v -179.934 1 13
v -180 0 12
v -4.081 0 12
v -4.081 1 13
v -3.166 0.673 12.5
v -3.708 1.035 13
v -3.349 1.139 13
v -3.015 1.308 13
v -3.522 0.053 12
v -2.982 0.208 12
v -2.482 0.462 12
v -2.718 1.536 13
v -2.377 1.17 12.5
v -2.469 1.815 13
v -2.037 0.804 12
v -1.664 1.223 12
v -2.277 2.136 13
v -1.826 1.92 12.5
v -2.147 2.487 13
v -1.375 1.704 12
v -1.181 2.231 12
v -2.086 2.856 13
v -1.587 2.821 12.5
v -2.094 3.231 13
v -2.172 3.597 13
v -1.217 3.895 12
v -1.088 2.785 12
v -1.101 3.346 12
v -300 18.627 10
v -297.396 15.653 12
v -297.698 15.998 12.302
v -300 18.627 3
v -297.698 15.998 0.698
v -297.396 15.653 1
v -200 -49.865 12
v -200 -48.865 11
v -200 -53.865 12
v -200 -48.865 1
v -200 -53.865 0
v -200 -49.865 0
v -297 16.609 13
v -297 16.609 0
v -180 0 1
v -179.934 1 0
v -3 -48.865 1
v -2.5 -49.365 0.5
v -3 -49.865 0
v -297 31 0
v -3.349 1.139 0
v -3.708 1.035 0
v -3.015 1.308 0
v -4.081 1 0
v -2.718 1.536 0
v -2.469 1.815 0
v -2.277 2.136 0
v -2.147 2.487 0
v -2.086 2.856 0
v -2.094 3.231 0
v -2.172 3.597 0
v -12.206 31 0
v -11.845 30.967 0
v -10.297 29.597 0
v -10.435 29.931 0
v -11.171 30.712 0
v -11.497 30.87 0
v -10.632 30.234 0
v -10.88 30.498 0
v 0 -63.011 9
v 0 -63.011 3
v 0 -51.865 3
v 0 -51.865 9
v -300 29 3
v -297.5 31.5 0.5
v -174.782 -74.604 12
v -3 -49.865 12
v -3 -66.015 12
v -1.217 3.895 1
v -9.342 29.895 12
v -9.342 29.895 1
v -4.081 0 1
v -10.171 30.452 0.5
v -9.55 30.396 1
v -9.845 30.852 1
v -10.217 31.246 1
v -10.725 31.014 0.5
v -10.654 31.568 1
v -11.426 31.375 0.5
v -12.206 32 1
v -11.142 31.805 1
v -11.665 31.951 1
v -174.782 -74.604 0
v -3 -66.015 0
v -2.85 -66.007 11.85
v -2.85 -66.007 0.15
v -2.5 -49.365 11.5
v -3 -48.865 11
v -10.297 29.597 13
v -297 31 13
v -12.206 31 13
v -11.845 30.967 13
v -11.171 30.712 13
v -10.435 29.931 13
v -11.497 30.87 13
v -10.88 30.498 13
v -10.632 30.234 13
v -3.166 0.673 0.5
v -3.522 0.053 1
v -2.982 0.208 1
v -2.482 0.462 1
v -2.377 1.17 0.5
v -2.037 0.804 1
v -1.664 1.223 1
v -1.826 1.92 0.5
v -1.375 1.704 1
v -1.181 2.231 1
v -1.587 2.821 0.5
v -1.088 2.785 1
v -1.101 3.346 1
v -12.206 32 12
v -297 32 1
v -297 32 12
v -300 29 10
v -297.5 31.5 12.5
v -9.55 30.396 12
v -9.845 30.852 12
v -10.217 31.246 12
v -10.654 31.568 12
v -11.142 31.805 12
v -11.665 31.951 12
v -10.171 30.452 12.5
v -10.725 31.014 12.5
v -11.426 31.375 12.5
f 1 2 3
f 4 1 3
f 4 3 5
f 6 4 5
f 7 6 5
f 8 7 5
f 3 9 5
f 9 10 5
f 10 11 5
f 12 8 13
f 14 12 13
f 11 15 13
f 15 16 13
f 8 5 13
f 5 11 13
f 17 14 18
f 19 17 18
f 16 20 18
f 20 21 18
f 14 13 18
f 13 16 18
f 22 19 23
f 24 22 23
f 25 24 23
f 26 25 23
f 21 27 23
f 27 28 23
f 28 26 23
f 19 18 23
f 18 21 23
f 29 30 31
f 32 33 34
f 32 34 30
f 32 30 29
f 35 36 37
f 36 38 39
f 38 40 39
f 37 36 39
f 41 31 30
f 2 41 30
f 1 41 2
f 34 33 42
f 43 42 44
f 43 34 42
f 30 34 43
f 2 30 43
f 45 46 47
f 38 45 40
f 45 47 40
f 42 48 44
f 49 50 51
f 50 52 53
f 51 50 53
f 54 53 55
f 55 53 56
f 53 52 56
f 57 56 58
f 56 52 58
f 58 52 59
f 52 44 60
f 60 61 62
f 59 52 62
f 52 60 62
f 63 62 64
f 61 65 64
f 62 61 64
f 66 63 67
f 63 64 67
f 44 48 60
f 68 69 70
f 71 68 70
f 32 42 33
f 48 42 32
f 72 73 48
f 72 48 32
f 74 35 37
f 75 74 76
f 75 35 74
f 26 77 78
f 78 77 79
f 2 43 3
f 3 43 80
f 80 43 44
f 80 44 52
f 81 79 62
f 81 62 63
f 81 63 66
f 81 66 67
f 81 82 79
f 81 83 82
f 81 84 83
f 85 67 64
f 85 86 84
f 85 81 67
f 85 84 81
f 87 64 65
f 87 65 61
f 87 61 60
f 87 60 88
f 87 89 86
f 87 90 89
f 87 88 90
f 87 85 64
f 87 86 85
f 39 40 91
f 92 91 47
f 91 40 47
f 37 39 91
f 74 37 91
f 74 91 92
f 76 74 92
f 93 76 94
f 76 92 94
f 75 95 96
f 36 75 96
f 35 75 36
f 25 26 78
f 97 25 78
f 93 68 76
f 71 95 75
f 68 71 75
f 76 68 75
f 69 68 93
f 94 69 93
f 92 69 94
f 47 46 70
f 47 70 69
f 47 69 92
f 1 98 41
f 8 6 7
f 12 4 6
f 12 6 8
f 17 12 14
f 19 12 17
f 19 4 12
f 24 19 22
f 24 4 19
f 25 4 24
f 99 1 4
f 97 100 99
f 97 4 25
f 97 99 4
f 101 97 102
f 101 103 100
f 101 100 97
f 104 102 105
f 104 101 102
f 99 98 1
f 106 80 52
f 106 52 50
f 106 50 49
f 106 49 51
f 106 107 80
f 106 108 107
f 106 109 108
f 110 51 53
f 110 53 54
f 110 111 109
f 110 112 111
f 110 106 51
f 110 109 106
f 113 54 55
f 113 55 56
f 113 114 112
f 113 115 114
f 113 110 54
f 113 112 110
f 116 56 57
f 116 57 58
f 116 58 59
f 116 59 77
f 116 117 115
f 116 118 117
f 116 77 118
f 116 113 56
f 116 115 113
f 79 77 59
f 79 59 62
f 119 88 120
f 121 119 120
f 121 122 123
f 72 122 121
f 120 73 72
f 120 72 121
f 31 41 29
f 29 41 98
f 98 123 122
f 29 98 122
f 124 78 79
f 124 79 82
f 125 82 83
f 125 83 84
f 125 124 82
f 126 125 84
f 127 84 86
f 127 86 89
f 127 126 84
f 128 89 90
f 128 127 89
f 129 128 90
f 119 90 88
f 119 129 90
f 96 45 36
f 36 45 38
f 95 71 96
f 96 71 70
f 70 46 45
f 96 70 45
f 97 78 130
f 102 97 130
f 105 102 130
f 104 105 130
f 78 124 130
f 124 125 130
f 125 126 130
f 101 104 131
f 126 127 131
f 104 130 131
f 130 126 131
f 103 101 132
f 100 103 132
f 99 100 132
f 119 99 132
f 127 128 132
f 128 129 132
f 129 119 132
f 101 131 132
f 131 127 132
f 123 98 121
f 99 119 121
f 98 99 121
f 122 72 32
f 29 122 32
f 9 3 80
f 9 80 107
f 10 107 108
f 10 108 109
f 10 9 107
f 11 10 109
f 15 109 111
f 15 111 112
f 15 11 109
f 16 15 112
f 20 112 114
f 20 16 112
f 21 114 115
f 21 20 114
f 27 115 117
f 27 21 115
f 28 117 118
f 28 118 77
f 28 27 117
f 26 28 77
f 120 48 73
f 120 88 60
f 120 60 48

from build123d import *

# Parameters (mm, degrees)
F1_DEPTH    = 13
F2_R        = 3
F3_T1_DEPTH = 31.4300979278
F3_T3_DEPTH = 28.4300979278
F3_T5_DEPTH = 26.5899249285
F4_SIZE     = 1
F6_DEPTH    = 12
F7_SIZE     = 1
F8_T1_DEPTH = 31.4300979278
F8_T3_DEPTH = 25.4300979278
F8_T5_DEPTH = 26.709280871


# Not quite as in the source:
# - a fillet or chamfer that OpenCascade refuses, or shapes differently, is made with other operations: its cross-section is extruded or revolved along the edge and cut away or added


with BuildPart() as f1:
    # F0 (on Top) → F1 (new body)
    with BuildSketch(Plane.XY):
        Polygon((-180, 0), (0, 0), (-10, 32), (-300, 32), (-300, 16), align=None)
    extrude(amount=F1_DEPTH)

    # F2
    f2_edges = [f1.edges().sort_by_distance(p)[0] for p in [
        (-10, 32, 6.5),
        (0, 0, 6.5),
    ]]
    fillet(f2_edges, radius=F2_R)

    # F3: chamfer of 3 on 4 edges, made by hand

    # F3_s2 → F3_t1 (cut)
    with BuildSketch(Plane.XZ.offset(-39.7150489639)):
        Polygon((-297, 13), (-300, 10), (-300, 13), align=None)
        Polygon((-297, 0), (-300, 3), (-300, 0), align=None)
    extrude(amount=F3_T1_DEPTH, mode=Mode.SUBTRACT)

    # F3_s4 → F3_t3 (cut)
    with BuildSketch(Plane.XY.offset(-7.7150489639)):
        Polygon((-300, 29), (-297, 32), (-300, 32), align=None)
    extrude(amount=F3_T3_DEPTH, mode=Mode.SUBTRACT)

    # F3_s6 → F3_t5 (cut)
    with BuildSketch(Plane.XY.offset(-6.7949624643)):
        Polygon((-297.3964911603, 15.652865488), (-300, 18.6265491901), (-300, 16), align=None)
    extrude(amount=F3_T5_DEPTH, mode=Mode.SUBTRACT)

    # F4
    f4_edges = [f1.edges().sort_by_distance(p)[0] for p in [
        (-154.602786, 32, 13),
        (-154.602786, 32, 0),
        (-238.5, 7.8, 13),
        (-92.040286, 0, 13),
        (-238.5, 7.8, 0),
        (-92.040286, 0, 0),
    ]]
    chamfer(f4_edges, length=F4_SIZE)


with BuildPart() as f6:
    # F5 (on Top) → F6 (new body)
    with BuildSketch(Plane.XY):
        Polygon((-174.7816593036, -74.6039791434), (0, -65.8648961782), (0, -48.8648961782), (-200, -48.8648961782), (-200, -53.8648961782), align=None)
    extrude(amount=F6_DEPTH)

    # F7
    f7_edges = [f6.edges().sort_by_distance(p)[0] for p in [
        (-100, -48.864896, 12),
        (-100, -48.864896, 0),
    ]]
    chamfer(f7_edges, length=F7_SIZE)

    # F8: chamfer of 3 on 4 edges, made by hand

    # F8_s2 → F8_t1 (cut)
    with BuildSketch(Plane.XZ.offset(42.1498472143)):
        Polygon((0, 9), (-3, 12), (0, 12), align=None)
        Polygon((0, 3), (-3, 0), (0, 0), align=None)
    extrude(amount=F8_T1_DEPTH, mode=Mode.SUBTRACT)

    # F8_s4 → F8_t3 (cut)
    with BuildSketch(Plane.XY.offset(-6.7150489639)):
        Polygon((0, -51.8648961782), (-3, -48.8648961782), (0, -48.8648961782), align=None)
    extrude(amount=F8_T3_DEPTH, mode=Mode.SUBTRACT)

    # F8_s6 → F8_t5 (cut)
    with BuildSketch(Plane.XY.offset(-7.3546404355)):
        Polygon((0, -63.0111485191), (-2.8501871492, -66.0074055357), (0, -65.8648961782), align=None)
    extrude(amount=F8_T5_DEPTH, mode=Mode.SUBTRACT)


solid = Compound([f1.part, f6.part])
